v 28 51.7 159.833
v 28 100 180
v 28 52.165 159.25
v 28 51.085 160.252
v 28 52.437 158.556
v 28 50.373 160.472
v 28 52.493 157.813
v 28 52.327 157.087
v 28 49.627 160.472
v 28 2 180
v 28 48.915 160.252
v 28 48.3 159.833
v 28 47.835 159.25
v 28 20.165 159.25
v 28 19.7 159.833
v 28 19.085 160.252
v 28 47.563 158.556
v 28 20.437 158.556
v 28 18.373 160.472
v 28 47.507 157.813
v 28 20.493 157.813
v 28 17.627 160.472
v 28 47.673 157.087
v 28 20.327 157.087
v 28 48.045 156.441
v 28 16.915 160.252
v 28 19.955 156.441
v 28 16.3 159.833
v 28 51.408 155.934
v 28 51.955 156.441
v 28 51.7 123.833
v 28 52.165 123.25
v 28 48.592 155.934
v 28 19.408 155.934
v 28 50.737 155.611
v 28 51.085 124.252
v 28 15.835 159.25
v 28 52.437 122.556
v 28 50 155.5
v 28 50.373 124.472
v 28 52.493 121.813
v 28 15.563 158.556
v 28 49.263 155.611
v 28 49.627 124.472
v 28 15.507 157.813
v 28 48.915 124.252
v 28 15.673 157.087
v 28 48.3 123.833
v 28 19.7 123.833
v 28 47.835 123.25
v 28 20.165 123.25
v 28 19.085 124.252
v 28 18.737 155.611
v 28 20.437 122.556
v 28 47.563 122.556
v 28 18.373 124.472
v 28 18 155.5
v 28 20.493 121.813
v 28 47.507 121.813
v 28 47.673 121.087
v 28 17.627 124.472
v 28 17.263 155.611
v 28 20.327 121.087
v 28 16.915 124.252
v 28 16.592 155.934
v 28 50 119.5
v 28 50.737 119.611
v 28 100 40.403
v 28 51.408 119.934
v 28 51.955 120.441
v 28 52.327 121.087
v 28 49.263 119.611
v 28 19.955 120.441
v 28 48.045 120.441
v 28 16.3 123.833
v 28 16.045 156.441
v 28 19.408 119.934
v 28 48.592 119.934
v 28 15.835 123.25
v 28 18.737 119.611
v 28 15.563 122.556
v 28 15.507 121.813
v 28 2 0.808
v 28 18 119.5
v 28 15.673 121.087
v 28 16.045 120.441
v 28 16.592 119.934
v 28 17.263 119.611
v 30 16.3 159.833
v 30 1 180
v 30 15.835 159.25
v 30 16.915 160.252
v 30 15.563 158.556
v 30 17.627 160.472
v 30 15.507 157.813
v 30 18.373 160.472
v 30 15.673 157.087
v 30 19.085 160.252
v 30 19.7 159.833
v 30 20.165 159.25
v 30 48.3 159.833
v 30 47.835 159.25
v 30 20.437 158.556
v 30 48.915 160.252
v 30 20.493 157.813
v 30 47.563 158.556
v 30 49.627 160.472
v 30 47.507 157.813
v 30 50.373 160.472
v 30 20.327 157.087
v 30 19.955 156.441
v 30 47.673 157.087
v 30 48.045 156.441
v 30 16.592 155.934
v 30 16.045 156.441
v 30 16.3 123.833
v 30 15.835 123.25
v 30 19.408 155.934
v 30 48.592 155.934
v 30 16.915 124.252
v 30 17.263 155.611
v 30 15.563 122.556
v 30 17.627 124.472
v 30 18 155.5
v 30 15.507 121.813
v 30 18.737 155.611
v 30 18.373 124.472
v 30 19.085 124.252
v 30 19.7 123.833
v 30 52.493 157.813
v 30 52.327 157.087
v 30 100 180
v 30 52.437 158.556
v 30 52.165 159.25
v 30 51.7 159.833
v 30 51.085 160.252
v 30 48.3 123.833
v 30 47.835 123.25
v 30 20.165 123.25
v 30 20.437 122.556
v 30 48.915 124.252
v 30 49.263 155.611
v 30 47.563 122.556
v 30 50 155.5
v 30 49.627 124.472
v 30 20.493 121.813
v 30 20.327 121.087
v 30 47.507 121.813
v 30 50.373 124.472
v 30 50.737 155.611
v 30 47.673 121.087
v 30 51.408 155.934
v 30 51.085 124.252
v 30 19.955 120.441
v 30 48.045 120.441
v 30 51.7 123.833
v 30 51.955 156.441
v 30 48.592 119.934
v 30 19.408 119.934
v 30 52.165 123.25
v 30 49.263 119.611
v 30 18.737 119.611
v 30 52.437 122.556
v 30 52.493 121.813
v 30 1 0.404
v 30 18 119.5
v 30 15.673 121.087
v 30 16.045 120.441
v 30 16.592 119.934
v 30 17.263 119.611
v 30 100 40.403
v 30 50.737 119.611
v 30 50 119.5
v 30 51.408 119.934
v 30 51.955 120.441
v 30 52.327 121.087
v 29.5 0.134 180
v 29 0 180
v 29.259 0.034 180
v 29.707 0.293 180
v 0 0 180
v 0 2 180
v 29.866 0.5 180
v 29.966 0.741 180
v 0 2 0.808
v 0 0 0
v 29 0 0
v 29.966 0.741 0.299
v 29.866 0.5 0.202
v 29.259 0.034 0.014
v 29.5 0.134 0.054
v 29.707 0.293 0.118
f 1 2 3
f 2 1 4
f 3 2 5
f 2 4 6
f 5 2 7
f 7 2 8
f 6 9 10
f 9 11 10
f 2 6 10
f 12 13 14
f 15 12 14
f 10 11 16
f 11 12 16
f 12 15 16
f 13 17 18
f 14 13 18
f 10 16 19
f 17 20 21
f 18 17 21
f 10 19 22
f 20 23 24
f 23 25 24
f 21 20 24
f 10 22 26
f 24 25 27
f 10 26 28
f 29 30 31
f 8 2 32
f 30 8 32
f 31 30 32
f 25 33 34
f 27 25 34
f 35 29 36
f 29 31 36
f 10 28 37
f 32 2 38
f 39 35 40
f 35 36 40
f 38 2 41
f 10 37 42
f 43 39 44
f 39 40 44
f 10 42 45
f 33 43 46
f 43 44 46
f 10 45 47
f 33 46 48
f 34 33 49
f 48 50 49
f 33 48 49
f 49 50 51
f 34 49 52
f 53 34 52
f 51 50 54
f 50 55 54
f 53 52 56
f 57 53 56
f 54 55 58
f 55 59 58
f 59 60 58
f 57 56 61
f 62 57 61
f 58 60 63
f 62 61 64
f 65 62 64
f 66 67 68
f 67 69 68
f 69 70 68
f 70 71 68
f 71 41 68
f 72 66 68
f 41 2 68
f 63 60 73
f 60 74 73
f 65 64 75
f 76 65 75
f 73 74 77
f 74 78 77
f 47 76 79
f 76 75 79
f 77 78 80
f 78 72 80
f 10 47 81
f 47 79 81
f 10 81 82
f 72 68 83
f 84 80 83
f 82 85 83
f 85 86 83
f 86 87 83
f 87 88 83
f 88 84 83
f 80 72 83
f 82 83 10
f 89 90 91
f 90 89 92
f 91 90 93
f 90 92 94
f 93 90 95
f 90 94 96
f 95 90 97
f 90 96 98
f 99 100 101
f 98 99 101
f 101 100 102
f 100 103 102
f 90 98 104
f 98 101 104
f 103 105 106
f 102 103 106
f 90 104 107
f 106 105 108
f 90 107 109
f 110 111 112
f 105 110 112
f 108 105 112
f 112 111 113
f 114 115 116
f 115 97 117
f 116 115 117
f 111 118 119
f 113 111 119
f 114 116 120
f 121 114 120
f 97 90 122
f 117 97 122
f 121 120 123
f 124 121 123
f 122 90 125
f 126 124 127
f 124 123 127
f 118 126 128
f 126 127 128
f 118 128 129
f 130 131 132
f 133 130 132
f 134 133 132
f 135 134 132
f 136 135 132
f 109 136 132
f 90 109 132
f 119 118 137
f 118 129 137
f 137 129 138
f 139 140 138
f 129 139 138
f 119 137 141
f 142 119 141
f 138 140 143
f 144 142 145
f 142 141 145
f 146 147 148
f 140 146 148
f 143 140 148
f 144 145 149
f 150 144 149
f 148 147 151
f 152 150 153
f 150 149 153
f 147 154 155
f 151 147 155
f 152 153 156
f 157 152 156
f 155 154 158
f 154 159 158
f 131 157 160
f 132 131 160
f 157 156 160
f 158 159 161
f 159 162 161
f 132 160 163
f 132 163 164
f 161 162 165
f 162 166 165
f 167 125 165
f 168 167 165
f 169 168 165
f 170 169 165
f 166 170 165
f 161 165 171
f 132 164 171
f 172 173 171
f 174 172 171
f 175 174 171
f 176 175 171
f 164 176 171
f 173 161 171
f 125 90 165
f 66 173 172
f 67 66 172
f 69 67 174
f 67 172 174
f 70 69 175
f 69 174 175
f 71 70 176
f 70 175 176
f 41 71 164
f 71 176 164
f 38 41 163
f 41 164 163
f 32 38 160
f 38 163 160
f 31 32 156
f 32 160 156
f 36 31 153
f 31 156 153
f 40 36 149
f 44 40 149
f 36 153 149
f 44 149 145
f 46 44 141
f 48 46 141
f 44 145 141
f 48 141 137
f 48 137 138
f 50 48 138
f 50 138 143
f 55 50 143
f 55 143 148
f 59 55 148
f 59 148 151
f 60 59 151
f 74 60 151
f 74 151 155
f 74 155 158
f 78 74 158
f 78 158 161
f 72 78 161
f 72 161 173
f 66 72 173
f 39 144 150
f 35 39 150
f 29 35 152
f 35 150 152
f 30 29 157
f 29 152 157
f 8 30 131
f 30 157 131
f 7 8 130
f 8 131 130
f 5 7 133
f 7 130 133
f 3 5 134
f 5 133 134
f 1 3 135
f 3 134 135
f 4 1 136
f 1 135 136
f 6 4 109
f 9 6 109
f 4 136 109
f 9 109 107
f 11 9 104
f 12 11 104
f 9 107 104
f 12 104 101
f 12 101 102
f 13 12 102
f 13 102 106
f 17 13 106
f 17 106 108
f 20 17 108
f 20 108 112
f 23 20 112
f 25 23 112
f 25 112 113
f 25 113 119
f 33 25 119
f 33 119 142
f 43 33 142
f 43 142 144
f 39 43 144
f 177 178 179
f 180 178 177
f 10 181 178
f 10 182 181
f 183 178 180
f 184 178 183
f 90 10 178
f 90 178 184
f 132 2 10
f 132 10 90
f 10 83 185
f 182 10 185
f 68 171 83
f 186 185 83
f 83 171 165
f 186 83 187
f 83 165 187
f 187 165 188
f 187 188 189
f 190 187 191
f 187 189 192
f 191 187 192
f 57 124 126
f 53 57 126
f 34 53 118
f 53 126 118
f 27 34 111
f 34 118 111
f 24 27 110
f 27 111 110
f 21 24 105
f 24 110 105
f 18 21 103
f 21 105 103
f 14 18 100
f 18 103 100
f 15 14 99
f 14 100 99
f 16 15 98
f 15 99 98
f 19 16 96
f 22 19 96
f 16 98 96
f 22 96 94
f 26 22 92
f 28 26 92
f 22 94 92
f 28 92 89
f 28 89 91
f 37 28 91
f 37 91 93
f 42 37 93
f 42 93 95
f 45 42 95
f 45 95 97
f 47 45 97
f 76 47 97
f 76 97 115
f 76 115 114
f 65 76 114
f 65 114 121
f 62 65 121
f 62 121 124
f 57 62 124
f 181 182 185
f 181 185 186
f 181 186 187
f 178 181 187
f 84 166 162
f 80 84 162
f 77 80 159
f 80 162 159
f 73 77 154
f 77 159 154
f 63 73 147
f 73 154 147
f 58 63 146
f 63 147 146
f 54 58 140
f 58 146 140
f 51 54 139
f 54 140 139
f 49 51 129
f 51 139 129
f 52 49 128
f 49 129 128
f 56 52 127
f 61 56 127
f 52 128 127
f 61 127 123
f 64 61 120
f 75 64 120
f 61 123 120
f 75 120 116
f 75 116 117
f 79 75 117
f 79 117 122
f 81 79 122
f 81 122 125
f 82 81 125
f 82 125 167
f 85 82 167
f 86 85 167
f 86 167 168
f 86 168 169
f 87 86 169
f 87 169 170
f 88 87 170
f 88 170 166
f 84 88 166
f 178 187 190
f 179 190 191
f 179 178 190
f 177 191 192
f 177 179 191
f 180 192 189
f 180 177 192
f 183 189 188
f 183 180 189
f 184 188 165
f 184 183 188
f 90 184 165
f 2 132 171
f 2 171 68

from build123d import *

# Parameters (mm, degrees)
BOSS_EXTRUDE1_DEPTH = 180
SKETCH2_R           = 2.5
CUT_EXTRUDE1_DEPTH  = 180
FILLET1_R           = 1


with BuildPart() as part:
    # Sketch1 → Boss-Extrude1 (new body)
    with BuildSketch(Plane.XY):
        Polygon((0, 0), (30, 0), (30, 100), (28, 100), (28, 2), (0, 2), align=None)
    extrude(amount=BOSS_EXTRUDE1_DEPTH)

    # Sketch2 → Cut-Extrude1 (cut)
    with BuildSketch(Plane(origin=(30, 0, 0), x_dir=(0, 0, -1), z_dir=(1, 0, 0))):
        with Locations((-122, 50)):
            Circle(SKETCH2_R)
        with Locations((-122, 18)):
            Circle(SKETCH2_R)
        with Locations((-158, 18)):
            Circle(SKETCH2_R)
        with Locations((-158, 50)):
            Circle(SKETCH2_R)
        Polygon((0, 0), (0, 100), (-40.402622584, 100), align=None)
    extrude(amount=-CUT_EXTRUDE1_DEPTH, mode=Mode.SUBTRACT)

    # Fillet1
    fillet1_edges = [part.edges().sort_by_distance(p)[0] for p in [
        (30, 0, 90),
    ]]
    fillet(fillet1_edges, radius=FILLET1_R)


solid = part.part
